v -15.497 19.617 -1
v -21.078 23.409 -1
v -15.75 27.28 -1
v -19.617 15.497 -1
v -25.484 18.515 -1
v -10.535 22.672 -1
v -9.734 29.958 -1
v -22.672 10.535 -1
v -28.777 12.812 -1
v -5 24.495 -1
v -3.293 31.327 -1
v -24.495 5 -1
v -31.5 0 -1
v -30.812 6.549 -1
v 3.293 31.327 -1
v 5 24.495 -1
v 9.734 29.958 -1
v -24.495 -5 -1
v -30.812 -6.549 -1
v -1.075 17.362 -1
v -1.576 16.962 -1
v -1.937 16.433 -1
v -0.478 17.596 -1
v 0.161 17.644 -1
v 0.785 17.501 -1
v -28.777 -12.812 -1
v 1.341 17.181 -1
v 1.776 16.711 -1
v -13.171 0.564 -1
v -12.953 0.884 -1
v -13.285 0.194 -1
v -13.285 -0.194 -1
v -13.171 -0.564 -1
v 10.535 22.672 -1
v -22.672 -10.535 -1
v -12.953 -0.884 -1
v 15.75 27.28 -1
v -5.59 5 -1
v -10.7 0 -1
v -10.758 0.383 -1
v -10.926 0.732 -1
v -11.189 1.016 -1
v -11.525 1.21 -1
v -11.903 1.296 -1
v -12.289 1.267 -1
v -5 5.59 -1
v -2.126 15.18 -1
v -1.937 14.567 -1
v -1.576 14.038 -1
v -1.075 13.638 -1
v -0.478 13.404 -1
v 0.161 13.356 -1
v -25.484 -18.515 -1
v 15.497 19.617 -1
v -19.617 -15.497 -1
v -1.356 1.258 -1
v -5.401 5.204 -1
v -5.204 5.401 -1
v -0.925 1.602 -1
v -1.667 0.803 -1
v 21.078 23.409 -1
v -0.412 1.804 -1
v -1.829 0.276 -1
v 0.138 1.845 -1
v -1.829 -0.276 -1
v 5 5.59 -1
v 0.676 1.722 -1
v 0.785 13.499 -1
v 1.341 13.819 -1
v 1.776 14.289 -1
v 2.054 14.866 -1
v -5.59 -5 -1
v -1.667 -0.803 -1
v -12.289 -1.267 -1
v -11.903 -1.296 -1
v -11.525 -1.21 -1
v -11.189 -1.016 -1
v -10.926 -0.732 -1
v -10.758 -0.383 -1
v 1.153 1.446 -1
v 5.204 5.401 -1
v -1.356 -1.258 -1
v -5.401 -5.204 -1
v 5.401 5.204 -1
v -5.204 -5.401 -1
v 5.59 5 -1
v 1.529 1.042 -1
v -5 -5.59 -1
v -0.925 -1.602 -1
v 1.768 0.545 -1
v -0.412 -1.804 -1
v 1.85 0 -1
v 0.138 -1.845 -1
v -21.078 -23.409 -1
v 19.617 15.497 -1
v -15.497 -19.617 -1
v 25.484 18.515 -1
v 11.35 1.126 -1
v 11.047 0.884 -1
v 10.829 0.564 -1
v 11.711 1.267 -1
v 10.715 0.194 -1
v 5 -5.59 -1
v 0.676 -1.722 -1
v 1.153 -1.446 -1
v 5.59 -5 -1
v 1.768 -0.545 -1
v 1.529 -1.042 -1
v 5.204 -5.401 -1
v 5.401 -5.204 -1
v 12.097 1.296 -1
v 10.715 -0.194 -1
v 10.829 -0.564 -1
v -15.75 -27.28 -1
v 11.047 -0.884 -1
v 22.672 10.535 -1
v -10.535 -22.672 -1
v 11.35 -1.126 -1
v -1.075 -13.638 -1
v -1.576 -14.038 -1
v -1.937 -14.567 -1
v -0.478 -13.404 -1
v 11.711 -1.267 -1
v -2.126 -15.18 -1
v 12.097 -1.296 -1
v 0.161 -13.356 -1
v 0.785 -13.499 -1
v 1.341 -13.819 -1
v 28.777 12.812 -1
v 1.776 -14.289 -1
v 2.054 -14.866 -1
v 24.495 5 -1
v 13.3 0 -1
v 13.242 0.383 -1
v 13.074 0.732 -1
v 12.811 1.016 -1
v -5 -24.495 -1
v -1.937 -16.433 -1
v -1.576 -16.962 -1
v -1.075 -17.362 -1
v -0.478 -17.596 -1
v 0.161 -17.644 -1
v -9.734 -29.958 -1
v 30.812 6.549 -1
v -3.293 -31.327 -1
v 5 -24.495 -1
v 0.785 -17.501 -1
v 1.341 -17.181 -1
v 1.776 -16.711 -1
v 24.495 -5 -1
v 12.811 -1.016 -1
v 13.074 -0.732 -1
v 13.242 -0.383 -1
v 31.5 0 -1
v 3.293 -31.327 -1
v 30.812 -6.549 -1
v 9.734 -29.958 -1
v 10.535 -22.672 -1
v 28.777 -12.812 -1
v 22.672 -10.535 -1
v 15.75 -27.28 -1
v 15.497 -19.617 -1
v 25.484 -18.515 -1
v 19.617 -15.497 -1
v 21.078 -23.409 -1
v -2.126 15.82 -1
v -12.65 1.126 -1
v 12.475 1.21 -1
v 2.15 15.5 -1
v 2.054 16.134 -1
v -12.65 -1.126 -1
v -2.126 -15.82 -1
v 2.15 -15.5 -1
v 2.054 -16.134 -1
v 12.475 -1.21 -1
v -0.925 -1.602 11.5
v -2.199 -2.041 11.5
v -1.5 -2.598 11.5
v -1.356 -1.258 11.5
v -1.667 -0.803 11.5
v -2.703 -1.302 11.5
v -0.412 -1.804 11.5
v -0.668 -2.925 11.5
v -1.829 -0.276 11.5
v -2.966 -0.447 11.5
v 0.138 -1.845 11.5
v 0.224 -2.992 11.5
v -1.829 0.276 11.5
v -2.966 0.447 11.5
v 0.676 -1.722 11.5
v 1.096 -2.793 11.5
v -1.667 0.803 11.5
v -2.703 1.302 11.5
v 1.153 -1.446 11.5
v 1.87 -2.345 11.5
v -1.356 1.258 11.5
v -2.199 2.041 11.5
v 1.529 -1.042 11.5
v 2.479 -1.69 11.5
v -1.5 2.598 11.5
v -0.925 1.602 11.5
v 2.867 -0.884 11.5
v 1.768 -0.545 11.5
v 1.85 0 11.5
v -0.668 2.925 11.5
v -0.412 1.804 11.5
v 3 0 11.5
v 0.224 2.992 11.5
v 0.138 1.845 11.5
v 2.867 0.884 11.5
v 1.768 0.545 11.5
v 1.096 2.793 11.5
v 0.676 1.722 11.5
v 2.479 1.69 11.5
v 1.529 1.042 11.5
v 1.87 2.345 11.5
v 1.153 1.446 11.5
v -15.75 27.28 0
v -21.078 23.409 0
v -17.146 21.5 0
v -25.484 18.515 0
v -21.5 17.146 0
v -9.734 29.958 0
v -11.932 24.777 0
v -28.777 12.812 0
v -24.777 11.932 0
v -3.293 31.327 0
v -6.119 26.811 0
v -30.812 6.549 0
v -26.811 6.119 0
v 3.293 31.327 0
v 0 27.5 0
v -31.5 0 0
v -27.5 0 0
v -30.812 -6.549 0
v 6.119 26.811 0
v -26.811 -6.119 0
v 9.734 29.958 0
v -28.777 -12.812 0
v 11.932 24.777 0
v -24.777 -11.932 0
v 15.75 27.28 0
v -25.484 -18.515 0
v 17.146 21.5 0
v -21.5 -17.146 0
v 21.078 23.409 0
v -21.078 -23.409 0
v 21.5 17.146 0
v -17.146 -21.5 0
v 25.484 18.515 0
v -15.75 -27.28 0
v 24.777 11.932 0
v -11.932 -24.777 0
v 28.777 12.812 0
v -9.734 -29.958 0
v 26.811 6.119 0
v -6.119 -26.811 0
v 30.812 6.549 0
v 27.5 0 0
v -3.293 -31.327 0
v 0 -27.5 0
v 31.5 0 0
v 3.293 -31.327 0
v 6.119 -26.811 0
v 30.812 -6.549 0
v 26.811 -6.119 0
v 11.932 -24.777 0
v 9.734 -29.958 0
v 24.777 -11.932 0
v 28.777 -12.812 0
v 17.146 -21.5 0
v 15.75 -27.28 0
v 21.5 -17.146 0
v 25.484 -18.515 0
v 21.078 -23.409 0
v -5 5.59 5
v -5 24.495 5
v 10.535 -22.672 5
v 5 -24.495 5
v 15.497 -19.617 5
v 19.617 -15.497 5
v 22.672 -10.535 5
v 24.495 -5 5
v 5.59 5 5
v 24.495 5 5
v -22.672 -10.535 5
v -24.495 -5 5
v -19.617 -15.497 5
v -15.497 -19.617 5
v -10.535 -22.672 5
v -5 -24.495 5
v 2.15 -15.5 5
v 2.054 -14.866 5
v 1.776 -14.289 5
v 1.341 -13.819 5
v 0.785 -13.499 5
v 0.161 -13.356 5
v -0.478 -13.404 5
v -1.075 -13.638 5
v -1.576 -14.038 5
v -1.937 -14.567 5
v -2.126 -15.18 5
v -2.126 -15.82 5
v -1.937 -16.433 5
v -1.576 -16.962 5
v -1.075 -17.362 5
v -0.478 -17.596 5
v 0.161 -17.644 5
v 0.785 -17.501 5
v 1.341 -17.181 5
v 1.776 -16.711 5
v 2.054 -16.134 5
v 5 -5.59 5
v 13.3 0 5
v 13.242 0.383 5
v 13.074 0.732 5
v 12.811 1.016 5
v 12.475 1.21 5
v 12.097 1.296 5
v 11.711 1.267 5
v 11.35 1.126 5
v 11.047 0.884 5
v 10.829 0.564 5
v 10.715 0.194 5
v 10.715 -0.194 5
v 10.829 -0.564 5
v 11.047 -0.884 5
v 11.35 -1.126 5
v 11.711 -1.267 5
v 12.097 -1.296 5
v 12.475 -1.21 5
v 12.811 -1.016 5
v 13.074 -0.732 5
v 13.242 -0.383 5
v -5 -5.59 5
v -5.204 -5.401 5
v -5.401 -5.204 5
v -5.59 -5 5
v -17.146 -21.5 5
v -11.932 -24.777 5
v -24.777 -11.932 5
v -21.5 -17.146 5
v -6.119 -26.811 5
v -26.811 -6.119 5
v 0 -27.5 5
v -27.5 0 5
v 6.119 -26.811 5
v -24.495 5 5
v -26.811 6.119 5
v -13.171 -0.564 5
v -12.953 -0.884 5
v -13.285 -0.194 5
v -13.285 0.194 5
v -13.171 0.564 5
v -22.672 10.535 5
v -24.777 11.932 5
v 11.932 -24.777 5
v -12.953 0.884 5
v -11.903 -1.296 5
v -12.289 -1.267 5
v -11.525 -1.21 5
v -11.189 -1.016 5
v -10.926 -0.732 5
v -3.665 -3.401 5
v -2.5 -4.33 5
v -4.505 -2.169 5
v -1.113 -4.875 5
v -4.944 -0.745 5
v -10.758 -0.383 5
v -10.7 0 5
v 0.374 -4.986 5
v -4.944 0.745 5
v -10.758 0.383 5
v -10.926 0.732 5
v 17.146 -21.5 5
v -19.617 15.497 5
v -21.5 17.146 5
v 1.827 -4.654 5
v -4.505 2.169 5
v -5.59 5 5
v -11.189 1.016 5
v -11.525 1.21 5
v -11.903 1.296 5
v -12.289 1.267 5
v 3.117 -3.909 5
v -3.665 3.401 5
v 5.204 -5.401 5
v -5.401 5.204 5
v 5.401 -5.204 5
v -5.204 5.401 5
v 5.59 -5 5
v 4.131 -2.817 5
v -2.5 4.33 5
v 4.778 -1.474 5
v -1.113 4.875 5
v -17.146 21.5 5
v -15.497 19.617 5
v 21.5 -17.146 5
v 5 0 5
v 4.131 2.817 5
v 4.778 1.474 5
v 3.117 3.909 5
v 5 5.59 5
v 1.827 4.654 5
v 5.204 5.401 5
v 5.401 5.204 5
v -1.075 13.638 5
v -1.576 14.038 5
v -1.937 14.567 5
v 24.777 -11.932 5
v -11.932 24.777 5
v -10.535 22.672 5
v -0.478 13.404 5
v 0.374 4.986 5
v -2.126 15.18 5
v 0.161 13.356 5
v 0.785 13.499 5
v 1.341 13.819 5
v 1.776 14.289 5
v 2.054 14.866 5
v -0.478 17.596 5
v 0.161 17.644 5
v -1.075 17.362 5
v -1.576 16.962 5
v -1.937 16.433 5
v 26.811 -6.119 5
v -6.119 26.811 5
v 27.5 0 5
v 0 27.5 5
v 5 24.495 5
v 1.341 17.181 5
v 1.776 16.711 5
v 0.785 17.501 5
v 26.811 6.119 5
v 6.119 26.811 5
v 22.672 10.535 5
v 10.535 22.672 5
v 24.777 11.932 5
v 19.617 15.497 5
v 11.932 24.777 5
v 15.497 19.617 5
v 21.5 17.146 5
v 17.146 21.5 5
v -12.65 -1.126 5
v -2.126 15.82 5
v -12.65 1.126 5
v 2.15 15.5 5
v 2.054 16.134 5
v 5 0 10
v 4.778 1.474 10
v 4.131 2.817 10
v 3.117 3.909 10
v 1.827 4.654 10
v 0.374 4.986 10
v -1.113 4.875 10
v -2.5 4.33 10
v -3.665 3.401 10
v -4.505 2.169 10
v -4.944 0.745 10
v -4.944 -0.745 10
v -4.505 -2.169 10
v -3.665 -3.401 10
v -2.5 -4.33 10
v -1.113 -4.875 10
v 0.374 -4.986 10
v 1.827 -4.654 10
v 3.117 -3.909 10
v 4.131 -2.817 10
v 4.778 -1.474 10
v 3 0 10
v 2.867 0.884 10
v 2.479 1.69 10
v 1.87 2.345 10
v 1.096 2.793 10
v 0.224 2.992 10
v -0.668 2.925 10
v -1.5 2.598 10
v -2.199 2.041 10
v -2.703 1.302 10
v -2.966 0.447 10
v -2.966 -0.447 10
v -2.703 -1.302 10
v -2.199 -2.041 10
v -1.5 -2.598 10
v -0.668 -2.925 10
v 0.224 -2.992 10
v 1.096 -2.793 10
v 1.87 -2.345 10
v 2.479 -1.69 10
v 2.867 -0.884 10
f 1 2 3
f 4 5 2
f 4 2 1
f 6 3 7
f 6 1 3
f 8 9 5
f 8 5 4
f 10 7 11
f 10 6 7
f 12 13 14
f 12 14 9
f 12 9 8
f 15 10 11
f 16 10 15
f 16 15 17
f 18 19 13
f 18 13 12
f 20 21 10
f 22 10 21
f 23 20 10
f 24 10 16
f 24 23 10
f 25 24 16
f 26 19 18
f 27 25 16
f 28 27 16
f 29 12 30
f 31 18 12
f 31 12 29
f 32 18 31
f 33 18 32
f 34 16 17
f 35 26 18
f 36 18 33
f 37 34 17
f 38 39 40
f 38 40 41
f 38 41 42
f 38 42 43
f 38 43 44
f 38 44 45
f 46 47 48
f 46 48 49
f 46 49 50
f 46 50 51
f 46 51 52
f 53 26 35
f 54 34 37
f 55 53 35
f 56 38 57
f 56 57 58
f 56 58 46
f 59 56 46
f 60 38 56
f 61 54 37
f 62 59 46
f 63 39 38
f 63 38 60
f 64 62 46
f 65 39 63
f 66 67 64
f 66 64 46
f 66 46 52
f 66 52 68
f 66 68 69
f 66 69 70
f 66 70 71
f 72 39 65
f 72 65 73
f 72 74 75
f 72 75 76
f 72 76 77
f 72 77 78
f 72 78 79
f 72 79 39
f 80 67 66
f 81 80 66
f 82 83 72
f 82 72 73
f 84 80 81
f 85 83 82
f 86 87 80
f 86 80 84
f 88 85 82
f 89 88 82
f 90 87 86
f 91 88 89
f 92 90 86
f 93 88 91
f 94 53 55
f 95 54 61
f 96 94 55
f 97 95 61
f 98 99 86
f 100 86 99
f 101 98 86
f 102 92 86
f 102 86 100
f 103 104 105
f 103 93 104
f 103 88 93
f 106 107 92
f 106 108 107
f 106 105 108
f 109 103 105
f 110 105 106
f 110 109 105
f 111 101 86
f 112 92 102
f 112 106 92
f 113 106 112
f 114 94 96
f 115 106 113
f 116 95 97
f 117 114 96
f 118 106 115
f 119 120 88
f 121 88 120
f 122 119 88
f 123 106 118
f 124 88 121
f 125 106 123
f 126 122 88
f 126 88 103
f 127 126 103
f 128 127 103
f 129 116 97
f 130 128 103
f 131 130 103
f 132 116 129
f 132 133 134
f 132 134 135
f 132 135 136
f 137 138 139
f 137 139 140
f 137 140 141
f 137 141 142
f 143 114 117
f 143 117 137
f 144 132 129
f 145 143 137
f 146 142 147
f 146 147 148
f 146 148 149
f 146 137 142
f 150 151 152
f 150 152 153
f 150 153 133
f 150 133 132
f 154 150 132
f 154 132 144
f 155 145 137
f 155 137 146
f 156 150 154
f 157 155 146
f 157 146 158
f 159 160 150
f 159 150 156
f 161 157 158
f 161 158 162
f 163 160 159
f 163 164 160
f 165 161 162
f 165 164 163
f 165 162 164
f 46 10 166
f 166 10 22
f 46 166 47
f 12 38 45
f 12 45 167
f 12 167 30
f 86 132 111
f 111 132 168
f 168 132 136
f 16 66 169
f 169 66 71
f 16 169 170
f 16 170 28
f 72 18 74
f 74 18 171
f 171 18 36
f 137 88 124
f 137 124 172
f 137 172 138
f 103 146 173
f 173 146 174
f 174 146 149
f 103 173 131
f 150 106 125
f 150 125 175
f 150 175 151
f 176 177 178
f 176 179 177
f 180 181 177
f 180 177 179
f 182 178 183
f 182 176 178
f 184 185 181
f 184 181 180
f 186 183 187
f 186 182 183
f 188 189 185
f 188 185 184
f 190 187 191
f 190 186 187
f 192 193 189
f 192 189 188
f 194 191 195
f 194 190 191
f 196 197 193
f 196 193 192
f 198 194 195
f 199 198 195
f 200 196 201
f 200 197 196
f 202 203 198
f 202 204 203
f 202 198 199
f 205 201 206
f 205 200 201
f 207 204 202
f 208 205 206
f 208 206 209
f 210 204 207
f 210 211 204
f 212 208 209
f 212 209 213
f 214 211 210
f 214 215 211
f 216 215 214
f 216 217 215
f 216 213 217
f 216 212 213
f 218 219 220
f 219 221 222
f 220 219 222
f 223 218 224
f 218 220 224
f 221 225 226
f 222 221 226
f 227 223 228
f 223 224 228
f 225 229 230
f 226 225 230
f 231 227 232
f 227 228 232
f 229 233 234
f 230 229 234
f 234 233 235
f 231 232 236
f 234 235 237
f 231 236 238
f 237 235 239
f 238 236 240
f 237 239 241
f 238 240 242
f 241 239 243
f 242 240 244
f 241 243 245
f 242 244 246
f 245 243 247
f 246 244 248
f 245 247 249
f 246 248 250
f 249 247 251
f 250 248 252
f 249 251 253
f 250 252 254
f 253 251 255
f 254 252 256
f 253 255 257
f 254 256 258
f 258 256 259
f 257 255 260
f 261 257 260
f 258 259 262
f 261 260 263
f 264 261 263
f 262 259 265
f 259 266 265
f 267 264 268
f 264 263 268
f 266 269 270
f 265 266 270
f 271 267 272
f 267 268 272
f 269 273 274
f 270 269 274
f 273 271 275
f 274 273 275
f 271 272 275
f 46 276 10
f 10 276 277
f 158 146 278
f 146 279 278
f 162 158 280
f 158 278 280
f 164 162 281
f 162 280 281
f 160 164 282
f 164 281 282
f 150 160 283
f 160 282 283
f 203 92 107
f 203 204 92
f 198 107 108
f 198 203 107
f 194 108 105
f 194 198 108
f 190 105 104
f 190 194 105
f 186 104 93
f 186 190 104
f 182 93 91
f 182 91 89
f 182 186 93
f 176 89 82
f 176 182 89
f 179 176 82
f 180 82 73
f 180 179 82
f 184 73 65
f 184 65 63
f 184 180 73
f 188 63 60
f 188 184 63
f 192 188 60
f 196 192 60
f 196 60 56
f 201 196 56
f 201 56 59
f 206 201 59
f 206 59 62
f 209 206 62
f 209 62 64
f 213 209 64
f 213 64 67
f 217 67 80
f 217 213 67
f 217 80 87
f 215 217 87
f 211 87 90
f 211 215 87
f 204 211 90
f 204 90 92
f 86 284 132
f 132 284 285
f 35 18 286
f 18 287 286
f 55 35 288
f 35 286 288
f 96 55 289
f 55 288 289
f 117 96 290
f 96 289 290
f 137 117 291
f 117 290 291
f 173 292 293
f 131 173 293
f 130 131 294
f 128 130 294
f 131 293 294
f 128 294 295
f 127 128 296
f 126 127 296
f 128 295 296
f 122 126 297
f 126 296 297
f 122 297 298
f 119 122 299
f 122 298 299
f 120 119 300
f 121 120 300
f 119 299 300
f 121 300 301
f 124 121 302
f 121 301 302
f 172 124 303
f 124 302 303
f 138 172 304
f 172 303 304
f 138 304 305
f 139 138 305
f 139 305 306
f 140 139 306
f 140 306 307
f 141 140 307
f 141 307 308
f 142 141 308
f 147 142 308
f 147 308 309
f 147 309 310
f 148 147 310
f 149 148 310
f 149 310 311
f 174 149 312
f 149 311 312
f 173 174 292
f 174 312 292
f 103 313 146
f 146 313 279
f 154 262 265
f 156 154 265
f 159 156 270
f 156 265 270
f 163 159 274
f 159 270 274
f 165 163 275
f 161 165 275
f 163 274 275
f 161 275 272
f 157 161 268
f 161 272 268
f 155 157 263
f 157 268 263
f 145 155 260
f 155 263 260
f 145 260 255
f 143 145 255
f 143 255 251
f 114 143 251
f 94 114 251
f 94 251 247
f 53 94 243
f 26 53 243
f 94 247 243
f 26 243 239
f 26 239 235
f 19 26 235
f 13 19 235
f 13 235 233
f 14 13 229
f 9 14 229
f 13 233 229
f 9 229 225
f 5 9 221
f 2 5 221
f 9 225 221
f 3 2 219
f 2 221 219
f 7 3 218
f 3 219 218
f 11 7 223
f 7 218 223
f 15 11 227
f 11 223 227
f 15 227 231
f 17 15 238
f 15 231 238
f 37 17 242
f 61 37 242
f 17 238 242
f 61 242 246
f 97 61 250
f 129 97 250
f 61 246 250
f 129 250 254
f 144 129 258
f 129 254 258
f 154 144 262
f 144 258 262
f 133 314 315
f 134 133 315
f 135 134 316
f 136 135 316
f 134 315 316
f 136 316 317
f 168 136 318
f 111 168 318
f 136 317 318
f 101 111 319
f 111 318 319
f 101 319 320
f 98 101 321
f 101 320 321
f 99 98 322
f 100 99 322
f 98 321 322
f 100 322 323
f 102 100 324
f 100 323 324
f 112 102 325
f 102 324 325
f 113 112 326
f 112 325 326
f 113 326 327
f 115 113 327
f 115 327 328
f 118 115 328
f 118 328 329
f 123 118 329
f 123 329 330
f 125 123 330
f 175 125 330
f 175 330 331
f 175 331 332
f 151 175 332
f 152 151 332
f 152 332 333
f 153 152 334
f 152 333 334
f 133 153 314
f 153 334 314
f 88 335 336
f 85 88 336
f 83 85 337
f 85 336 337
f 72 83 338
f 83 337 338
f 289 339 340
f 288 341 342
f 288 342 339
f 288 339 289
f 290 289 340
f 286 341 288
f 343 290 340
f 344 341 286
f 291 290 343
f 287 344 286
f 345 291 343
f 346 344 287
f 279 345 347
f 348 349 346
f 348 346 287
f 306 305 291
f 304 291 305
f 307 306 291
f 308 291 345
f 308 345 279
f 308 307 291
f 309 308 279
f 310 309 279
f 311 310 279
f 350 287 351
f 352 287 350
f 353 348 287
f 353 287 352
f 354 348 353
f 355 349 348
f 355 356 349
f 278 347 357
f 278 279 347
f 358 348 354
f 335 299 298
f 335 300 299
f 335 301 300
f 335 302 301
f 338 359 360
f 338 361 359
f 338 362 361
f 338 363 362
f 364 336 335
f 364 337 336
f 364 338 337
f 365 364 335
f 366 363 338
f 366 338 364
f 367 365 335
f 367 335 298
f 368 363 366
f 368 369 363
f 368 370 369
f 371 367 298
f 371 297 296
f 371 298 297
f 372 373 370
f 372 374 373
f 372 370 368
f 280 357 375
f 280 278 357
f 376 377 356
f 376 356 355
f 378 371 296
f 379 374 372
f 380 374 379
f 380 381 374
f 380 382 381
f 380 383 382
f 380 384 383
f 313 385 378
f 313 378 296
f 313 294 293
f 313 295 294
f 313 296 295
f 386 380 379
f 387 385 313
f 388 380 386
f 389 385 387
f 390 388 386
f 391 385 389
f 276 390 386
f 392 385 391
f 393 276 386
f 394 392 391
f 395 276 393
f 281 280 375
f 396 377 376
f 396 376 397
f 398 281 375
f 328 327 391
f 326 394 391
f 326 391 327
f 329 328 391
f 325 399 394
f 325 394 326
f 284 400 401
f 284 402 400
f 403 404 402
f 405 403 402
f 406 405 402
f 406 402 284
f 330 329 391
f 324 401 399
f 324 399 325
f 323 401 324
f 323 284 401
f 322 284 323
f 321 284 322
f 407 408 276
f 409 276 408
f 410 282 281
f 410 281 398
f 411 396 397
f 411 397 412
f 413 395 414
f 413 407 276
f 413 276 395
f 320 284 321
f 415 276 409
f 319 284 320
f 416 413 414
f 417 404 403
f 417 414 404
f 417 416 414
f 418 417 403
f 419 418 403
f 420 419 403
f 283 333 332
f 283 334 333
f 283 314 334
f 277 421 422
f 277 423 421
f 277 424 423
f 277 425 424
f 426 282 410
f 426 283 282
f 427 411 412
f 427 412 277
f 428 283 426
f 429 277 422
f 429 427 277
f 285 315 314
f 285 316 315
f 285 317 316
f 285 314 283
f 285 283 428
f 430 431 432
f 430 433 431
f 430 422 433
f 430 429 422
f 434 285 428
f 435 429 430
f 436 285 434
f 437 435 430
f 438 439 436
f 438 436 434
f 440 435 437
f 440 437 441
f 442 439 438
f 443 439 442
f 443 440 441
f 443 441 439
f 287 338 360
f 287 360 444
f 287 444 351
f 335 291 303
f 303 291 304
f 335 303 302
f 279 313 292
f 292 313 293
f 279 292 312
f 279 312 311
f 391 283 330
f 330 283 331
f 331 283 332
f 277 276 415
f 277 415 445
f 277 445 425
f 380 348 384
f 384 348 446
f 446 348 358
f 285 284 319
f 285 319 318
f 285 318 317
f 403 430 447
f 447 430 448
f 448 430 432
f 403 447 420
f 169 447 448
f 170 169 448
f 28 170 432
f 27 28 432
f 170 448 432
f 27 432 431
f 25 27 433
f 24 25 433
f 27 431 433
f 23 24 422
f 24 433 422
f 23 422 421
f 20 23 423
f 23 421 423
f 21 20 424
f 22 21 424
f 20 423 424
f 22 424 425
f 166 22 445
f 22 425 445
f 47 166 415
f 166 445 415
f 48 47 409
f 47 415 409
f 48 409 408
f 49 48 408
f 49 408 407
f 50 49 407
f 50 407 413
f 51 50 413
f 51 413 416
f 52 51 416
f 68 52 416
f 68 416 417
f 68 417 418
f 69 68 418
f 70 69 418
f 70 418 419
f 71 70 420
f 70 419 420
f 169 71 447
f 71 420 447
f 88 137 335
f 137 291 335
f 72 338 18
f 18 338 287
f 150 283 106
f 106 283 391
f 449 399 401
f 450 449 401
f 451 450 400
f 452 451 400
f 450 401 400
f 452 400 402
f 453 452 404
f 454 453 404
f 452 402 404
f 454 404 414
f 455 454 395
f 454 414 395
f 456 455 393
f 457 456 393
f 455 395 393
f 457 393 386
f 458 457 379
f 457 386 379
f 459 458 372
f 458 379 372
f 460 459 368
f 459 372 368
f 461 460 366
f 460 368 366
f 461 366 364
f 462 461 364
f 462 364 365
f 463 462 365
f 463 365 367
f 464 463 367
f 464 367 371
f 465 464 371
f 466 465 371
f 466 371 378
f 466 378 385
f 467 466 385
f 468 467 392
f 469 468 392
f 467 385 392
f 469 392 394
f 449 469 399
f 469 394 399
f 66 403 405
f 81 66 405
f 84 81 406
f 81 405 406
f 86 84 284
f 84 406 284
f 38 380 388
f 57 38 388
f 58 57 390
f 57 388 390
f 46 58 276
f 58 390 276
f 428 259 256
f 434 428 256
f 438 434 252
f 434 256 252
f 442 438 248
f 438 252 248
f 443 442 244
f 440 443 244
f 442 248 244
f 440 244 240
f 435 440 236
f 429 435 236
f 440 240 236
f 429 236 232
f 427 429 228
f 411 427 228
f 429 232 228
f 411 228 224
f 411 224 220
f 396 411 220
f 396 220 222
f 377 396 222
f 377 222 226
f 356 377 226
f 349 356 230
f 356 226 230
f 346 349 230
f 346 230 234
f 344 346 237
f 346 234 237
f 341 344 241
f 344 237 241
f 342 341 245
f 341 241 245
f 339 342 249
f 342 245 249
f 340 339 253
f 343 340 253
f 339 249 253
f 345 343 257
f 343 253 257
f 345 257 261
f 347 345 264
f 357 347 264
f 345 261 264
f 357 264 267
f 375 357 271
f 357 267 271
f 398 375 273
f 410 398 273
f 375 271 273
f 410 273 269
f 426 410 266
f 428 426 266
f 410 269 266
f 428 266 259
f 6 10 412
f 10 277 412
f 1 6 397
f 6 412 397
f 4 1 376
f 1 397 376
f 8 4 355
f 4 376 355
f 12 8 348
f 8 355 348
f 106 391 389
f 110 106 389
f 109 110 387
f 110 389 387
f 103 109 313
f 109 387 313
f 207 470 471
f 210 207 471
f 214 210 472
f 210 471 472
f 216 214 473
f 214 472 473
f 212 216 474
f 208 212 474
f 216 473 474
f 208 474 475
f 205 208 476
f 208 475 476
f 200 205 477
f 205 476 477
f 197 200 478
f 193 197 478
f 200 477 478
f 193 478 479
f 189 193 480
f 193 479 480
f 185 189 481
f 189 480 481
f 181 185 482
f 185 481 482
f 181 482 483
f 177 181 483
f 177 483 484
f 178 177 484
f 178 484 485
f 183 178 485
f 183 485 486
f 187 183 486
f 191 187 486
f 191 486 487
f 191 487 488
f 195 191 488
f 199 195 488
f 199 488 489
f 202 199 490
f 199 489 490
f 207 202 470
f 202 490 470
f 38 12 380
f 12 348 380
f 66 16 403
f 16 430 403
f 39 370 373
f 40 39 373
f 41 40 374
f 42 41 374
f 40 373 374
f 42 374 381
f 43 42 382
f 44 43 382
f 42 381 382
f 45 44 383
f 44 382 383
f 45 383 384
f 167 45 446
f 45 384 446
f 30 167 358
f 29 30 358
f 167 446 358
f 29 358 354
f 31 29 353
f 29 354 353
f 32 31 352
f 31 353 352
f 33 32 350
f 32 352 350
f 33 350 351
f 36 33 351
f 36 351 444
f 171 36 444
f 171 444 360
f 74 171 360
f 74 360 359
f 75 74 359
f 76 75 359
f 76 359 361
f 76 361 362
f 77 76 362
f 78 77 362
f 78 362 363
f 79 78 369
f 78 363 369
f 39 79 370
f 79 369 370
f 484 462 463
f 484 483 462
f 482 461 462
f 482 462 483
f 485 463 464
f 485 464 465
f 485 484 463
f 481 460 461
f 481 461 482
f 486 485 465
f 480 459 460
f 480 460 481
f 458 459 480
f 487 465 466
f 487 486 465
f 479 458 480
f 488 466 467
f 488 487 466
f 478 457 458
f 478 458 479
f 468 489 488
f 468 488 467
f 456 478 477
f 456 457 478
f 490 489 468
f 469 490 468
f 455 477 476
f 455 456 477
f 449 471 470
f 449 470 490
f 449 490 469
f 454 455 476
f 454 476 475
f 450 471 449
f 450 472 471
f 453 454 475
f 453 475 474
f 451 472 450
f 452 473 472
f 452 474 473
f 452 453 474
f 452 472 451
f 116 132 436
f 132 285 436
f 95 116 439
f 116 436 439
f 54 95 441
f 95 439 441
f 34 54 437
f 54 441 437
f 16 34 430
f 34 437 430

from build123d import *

# Parameters (mm, degrees)
F0_R      = 27.5
F1_DEPTH  = 5
F2_R      = 5
F3_DEPTH  = 5
F4_R      = 1.85
F5_DEPTH  = 10
F6_R      = 3
F6_R_2    = 1.85
F7_DEPTH  = 1.5
F9_DEPTH  = 5
F10_R     = 31.5
F10_R_2   = 27.5
F10_R_3   = 1.85
F11_DEPTH = 1
F8_R      = 1.3
F8_R_2    = 2.15
F12_DEPTH = 6


with BuildPart() as f1:
    # F0 (on Top) → F1 (new body)
    with BuildSketch(Plane.XY):
        Circle(F0_R)
    extrude(amount=F1_DEPTH)

    # F2 (on face) → F3 (join)
    with BuildSketch(Plane.XY.offset(5)):
        Circle(F2_R)
    extrude(amount=F3_DEPTH)

    # F4 (on face) → F5 (cut, through all)
    with BuildSketch(Plane.XY.offset(10)):
        Circle(F4_R)
    extrude(amount=-F5_DEPTH, mode=Mode.SUBTRACT)

    # F6 (on face) → F7 (join)
    with BuildSketch(Plane.XY.offset(10)):
        Circle(F6_R)
        Circle(F6_R_2, mode=Mode.SUBTRACT)
    extrude(amount=F7_DEPTH)

    # F8 (on face) → F9 (cut, through all)
    with BuildSketch(Plane.XY.offset(5)):
        with BuildLine():
            Line((5.5901699437, 5), (24.4948974278, 5))
            ThreePointArc((24.4948974278, 5), (17.6776695297, 17.6776695297), (5, 24.4948974278))
            Line((5, 24.4948974278), (5, 5.5901699437))
            ThreePointArc((5, 5.5901699437), (5.3033008589, 5.3033008589), (5.5901699437, 5))
        make_face()
        with BuildLine():
            Line((-5, 5.5901699437), (-5, 24.4948974278))
            ThreePointArc((-5, 24.4948974278), (-17.6776695297, 17.6776695297), (-24.4948974278, 5))
            Line((-24.4948974278, 5), (-5.5901699437, 5))
            ThreePointArc((-5.5901699437, 5), (-5.3033008589, 5.3033008589), (-5, 5.5901699437))
        make_face()
        with BuildLine():
            ThreePointArc((-24.4948974278, -5), (-17.6776695297, -17.6776695297), (-5, -24.4948974278))
            Line((-5, -24.4948974278), (-5, -5.5901699437))
            ThreePointArc((-5, -5.5901699437), (-5.3033008589, -5.3033008589), (-5.5901699437, -5))
            Line((-5.5901699437, -5), (-24.4948974278, -5))
        make_face()
        with BuildLine():
            ThreePointArc((5, -24.4948974278), (17.6776695297, -17.6776695297), (24.4948974278, -5))
            Line((24.4948974278, -5), (5.5901699437, -5))
            ThreePointArc((5.5901699437, -5), (5.3033008589, -5.3033008589), (5, -5.5901699437))
            Line((5, -5.5901699437), (5, -24.4948974278))
        make_face()
    extrude(amount=-F9_DEPTH, mode=Mode.SUBTRACT)

    # F10 (on face) → F11 (join)
    with BuildSketch(Plane(origin=(0, 0, 0), x_dir=(1, 0, 0), z_dir=(0, 0, -1))):
        Circle(F10_R)
        Circle(F10_R_2, mode=Mode.SUBTRACT)
        Circle(F10_R_2)
        with BuildLine():
            ThreePointArc((-5, -24.4948974278), (-17.6776695297, -17.6776695297), (-24.4948974278, -5))
            Line((-24.4948974278, -5), (-5.5901699437, -5))
            ThreePointArc((-5.5901699437, -5), (-5.3033008589, -5.3033008589), (-5, -5.5901699437))
            Line((-5, -5.5901699437), (-5, -24.4948974278))
        make_face(mode=Mode.SUBTRACT)
        with BuildLine():
            ThreePointArc((24.4948974278, -5), (17.6776695297, -17.6776695297), (5, -24.4948974278))
            Line((5, -24.4948974278), (5, -5.5901699437))
            ThreePointArc((5, -5.5901699437), (5.3033008589, -5.3033008589), (5.5901699437, -5))
            Line((5.5901699437, -5), (24.4948974278, -5))
        make_face(mode=Mode.SUBTRACT)
        with BuildLine():
            ThreePointArc((-24.4948974278, 5), (-17.6776695297, 17.6776695297), (-5, 24.4948974278))
            Line((-5, 24.4948974278), (-5, 5.5901699437))
            ThreePointArc((-5, 5.5901699437), (-5.3033008589, 5.3033008589), (-5.5901699437, 5))
            Line((-5.5901699437, 5), (-24.4948974278, 5))
        make_face(mode=Mode.SUBTRACT)
        Circle(F10_R_3, mode=Mode.SUBTRACT)
        with BuildLine():
            ThreePointArc((5, 24.4948974278), (17.6776695297, 17.6776695297), (24.4948974278, 5))
            Line((24.4948974278, 5), (5.5901699437, 5))
            ThreePointArc((5.5901699437, 5), (5.3033008589, 5.3033008589), (5, 5.5901699437))
            Line((5, 5.5901699437), (5, 24.4948974278))
        make_face(mode=Mode.SUBTRACT)
    extrude(amount=F11_DEPTH)

    # F8 (on face) → F12 (cut, through all)
    with BuildSketch(Plane.XY.offset(5)):
        with Locations((-12, 0)):
            Circle(F8_R)
        with Locations((0, -15.5)):
            Circle(F8_R_2)
        with Locations((12, 0)):
            Circle(F8_R)
        with Locations((0, 15.5)):
            Circle(F8_R_2)
    extrude(amount=-F12_DEPTH, mode=Mode.SUBTRACT)


solid = f1.part
